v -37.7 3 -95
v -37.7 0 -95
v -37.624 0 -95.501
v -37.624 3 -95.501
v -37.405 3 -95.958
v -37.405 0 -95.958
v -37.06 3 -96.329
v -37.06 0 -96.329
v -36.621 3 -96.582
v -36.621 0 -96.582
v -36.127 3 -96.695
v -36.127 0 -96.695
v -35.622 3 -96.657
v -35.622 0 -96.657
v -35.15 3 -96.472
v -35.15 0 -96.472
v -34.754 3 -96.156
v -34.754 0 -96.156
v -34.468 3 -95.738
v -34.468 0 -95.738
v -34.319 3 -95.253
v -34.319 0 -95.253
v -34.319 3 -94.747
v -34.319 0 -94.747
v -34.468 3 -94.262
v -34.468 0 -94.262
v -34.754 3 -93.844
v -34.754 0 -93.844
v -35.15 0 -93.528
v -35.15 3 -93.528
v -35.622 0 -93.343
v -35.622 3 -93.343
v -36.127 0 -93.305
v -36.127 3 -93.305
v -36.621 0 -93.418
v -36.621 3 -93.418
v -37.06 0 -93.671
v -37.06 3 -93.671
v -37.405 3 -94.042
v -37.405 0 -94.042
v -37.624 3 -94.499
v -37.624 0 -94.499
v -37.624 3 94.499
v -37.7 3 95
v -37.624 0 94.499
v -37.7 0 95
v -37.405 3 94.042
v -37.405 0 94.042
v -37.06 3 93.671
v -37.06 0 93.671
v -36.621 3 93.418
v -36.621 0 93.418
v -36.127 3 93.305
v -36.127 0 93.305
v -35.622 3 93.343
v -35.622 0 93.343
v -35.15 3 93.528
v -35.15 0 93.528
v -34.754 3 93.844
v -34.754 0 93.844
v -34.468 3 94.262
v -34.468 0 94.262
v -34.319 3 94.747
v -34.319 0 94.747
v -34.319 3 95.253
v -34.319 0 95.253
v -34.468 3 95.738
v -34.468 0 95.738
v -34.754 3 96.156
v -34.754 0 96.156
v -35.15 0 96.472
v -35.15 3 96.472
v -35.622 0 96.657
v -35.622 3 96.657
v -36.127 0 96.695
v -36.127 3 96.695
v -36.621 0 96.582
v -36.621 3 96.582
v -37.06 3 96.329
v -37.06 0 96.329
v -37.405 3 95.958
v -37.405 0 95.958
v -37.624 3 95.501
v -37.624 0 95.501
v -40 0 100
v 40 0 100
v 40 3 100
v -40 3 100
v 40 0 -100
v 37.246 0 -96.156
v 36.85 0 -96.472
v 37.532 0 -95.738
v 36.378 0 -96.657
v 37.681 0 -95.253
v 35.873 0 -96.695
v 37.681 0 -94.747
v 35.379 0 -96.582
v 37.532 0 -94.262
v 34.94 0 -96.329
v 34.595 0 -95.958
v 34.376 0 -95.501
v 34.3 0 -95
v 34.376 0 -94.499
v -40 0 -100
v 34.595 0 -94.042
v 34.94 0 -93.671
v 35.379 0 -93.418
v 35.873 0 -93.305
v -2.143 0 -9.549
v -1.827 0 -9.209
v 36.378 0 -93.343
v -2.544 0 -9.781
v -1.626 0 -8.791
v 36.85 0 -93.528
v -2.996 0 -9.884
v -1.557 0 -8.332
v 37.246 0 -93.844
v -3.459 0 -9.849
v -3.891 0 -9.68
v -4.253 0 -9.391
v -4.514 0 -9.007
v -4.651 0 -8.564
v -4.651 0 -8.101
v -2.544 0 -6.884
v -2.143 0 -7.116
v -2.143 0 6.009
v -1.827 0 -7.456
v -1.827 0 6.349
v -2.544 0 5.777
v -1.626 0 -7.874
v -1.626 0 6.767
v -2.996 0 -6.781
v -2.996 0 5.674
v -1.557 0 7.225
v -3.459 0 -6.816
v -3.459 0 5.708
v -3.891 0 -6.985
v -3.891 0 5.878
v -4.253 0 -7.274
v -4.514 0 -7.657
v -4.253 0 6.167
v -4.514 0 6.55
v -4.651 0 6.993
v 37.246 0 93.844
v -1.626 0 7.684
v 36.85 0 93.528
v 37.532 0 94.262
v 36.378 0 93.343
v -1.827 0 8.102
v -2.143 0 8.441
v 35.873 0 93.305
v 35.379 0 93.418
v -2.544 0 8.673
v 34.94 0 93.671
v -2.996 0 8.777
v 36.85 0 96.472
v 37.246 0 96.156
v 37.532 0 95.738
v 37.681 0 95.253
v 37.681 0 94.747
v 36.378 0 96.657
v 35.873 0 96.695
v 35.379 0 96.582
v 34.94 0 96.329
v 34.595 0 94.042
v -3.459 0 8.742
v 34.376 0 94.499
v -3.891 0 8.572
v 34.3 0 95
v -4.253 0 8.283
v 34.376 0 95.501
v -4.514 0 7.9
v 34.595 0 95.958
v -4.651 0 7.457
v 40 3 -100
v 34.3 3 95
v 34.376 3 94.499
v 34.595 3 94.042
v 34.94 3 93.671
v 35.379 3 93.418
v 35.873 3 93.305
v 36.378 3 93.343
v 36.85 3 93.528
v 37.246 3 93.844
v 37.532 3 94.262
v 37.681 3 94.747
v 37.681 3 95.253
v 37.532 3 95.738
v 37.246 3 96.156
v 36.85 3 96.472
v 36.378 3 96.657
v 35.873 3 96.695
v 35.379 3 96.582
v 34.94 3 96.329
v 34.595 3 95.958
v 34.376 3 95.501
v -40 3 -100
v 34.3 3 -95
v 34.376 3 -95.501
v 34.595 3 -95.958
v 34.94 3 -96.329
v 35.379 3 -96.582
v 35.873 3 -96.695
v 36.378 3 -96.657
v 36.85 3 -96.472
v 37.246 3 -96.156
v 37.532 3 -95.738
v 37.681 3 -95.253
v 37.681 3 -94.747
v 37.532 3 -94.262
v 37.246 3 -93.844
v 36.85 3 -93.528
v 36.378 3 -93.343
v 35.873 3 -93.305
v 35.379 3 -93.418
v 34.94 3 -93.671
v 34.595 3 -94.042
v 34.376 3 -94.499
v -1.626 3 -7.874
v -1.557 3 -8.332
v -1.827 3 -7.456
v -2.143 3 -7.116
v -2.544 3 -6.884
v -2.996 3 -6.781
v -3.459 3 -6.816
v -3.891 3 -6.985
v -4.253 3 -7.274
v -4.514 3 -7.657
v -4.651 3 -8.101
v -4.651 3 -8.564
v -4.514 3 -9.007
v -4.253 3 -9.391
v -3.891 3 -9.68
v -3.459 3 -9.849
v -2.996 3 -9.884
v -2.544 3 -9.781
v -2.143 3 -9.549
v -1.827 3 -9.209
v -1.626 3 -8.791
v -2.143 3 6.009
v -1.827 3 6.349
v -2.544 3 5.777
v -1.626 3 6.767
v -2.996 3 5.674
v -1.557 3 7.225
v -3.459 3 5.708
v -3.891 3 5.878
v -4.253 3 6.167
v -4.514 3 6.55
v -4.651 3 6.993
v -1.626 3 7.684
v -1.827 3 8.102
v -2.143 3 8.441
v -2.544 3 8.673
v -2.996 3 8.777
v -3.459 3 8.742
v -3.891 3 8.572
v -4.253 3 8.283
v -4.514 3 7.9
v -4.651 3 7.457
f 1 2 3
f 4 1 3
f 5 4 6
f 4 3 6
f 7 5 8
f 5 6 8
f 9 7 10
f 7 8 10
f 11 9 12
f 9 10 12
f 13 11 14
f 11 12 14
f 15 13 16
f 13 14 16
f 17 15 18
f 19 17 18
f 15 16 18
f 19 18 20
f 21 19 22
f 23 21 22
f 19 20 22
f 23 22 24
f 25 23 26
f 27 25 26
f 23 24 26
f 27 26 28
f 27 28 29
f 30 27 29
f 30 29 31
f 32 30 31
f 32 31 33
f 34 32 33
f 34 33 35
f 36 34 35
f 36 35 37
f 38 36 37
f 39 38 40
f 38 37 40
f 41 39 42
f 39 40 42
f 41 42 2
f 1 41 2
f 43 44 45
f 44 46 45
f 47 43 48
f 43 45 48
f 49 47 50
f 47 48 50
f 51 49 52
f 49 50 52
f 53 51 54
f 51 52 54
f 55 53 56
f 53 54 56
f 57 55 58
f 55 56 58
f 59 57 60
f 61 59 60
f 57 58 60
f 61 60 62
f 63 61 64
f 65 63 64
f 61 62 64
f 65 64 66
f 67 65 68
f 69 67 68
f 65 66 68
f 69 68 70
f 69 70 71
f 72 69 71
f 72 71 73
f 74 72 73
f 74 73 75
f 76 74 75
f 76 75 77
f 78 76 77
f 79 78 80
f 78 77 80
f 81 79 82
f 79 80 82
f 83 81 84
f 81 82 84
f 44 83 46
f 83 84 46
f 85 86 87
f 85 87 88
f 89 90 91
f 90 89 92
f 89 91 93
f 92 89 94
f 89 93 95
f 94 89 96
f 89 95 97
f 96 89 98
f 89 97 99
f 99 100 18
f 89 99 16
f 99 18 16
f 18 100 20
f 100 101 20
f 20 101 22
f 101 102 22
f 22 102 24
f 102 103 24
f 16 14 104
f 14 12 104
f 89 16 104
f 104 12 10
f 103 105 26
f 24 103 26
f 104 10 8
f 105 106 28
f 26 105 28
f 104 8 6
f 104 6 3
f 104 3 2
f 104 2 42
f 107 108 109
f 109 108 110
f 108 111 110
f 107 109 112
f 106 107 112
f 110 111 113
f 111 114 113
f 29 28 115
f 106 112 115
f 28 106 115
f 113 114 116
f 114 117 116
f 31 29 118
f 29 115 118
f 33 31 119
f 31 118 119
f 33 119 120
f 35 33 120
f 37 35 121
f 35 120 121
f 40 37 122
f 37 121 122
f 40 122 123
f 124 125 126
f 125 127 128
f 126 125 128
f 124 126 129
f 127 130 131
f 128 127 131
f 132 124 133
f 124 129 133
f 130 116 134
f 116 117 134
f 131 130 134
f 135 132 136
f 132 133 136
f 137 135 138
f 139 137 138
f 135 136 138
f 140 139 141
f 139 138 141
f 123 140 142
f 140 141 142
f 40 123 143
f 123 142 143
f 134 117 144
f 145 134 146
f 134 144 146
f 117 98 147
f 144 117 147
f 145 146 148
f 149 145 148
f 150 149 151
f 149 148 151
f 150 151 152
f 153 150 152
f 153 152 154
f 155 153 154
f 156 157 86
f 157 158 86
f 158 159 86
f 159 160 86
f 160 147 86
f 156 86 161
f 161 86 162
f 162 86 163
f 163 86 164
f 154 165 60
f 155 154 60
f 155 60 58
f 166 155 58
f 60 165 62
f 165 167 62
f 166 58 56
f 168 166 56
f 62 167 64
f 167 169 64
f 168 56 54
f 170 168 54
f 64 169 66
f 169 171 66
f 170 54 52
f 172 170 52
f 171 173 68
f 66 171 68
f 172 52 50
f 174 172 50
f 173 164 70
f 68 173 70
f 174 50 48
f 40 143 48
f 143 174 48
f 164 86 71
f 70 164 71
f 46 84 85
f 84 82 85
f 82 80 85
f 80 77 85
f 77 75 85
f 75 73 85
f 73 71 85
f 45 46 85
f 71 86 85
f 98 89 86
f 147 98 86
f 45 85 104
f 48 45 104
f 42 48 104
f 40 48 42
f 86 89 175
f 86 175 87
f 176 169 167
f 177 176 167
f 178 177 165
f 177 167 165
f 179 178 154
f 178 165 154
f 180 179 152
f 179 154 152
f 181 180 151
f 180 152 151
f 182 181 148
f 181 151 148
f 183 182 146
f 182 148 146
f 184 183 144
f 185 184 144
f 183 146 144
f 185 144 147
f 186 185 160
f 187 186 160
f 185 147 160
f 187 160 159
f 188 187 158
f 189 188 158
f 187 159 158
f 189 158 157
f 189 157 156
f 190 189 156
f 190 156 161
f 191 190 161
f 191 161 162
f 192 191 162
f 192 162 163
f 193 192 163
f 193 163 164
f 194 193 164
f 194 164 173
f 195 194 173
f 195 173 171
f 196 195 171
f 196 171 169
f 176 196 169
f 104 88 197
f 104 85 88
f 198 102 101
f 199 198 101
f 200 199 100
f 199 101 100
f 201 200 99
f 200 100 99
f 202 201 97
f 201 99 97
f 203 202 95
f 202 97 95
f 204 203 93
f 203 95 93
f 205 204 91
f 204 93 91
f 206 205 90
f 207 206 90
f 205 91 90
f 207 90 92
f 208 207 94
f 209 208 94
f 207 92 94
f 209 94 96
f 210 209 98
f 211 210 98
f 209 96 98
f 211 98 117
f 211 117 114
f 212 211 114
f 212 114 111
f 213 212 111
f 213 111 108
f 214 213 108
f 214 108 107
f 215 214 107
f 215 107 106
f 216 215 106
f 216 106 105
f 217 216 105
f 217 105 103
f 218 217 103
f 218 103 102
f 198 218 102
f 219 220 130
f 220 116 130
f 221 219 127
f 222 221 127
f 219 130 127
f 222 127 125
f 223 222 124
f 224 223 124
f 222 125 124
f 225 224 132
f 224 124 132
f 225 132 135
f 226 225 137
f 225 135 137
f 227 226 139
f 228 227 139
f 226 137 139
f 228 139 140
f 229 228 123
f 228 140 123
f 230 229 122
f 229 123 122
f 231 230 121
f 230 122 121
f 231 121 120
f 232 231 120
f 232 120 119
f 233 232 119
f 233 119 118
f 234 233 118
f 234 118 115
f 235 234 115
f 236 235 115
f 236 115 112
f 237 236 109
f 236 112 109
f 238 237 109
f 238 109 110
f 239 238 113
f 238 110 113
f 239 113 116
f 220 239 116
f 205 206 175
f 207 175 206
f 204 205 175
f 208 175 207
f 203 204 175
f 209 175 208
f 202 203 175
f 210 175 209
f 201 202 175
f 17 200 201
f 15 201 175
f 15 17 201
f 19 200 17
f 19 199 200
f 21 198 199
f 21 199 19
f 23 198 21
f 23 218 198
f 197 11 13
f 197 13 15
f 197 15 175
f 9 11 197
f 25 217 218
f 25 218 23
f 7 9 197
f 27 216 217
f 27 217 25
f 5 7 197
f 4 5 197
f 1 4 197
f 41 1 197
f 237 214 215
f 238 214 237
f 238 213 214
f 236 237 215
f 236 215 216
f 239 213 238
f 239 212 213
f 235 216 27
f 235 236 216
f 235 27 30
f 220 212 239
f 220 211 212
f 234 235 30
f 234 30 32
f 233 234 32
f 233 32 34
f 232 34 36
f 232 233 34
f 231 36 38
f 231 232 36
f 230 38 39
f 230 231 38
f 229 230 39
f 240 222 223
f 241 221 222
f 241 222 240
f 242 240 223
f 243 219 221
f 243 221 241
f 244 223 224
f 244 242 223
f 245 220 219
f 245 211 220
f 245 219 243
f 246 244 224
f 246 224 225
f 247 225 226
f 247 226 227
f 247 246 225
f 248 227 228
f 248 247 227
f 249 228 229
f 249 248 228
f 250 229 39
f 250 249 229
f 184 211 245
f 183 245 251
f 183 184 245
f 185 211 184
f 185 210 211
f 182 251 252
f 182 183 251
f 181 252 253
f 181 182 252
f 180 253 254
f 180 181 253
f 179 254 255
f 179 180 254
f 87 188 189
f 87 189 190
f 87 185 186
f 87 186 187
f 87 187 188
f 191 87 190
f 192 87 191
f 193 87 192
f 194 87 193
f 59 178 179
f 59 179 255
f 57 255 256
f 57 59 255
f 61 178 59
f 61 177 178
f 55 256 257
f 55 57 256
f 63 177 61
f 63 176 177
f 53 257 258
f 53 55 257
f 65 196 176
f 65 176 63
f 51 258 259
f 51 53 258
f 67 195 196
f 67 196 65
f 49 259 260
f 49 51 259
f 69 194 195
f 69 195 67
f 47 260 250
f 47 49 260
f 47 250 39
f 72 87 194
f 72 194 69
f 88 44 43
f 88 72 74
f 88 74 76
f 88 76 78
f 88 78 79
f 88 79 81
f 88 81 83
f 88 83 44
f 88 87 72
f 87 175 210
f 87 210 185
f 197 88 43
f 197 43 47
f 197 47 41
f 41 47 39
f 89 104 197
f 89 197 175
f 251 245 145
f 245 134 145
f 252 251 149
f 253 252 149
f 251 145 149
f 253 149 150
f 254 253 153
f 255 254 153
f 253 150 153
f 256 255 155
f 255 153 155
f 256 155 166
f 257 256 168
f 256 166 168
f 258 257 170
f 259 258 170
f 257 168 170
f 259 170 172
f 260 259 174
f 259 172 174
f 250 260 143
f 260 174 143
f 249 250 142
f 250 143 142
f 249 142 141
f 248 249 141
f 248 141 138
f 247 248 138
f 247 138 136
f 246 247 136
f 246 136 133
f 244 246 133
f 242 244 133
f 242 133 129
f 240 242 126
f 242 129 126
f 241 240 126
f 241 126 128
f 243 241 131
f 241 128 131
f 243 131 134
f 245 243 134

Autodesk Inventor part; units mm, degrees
ref_plane "YZ Plane" through (0, 0, 0) normal (1, 0, 0) x (0, 1, 0)
ref_plane "XZ Plane" through (0, 0, 0) normal (0, 1, 0) x (-1, 0, 0)
ref_plane "XY Plane" through (0, 0, 0) normal (0, 0, 1) x (1, 0, 0)
sketch "Skizze1" plane through (0, 0, 0) normal (0, 1, 0) x (-1, 0, 0)
  line L0 (40, 100) -> (40, -100)
  line L1 (40, -100) -> (-40, -100)
  line L2 (-40, -100) -> (-40, 100)
  line L3 (-40, 100) -> (40, 100)
  line L4 (0, 61.8387) -> (0, -129.7607) construction
  line L5 (83.0665, 0) -> (-88.5254, 0) construction
  circle A0 centre (36, 95) radius 1.7
  circle A1 centre (-36, 95) radius 1.7
  circle A2 centre (-36, -95) radius 1.7
  circle A3 centre (36, -95) radius 1.7
  circle A4 centre (3.1127, 7.2251) radius 1.5558
  circle A5 centre (3.1127, -8.3324) radius 1.5558
  point P0 (0, 0)
  dimension "d1" = 40
  dimension "d2" = 40
  dimension "d3" = 100
  dimension "d4" = 100
  dimension "d7" = 3.4
  dimension "d8" = 4
  dimension "d9" = 5
  dimension "d10" = 3.4
  dimension "d11" = 4
  dimension "d12" = 5
  dimension "d13" = 3.4
  dimension "d14" = 4
  dimension "d15" = 5
  dimension "d16" = 3.4
  dimension "d17" = 5
  dimension "d18" = 4
extrude "Extrusion1" add sketch "Skizze1" along normal blind 3 contours L0 L1 L2 L3 | A0 | A1 | A2 | A3 | A4 | A5
extrude "Extrusion2" cut sketch "Skizze1" along normal blind 10 contours A0 | A1 | A2 | A3
sketch "Skizze2" plane through (0, 0, 0) normal (0, -1, 0) x (1, 0, 0)
  circle A0 centre (-3.1127, 7.2251) radius 1.5558 projected
  circle A1 centre (-3.1127, -8.3324) radius 1.5558 projected
  point P0 (0, 0)
extrude "Extrusion3" cut sketch "Skizze2" against normal blind 10
properties part number "Chassis-2" material "Polycarbonat, rauchfarben"
